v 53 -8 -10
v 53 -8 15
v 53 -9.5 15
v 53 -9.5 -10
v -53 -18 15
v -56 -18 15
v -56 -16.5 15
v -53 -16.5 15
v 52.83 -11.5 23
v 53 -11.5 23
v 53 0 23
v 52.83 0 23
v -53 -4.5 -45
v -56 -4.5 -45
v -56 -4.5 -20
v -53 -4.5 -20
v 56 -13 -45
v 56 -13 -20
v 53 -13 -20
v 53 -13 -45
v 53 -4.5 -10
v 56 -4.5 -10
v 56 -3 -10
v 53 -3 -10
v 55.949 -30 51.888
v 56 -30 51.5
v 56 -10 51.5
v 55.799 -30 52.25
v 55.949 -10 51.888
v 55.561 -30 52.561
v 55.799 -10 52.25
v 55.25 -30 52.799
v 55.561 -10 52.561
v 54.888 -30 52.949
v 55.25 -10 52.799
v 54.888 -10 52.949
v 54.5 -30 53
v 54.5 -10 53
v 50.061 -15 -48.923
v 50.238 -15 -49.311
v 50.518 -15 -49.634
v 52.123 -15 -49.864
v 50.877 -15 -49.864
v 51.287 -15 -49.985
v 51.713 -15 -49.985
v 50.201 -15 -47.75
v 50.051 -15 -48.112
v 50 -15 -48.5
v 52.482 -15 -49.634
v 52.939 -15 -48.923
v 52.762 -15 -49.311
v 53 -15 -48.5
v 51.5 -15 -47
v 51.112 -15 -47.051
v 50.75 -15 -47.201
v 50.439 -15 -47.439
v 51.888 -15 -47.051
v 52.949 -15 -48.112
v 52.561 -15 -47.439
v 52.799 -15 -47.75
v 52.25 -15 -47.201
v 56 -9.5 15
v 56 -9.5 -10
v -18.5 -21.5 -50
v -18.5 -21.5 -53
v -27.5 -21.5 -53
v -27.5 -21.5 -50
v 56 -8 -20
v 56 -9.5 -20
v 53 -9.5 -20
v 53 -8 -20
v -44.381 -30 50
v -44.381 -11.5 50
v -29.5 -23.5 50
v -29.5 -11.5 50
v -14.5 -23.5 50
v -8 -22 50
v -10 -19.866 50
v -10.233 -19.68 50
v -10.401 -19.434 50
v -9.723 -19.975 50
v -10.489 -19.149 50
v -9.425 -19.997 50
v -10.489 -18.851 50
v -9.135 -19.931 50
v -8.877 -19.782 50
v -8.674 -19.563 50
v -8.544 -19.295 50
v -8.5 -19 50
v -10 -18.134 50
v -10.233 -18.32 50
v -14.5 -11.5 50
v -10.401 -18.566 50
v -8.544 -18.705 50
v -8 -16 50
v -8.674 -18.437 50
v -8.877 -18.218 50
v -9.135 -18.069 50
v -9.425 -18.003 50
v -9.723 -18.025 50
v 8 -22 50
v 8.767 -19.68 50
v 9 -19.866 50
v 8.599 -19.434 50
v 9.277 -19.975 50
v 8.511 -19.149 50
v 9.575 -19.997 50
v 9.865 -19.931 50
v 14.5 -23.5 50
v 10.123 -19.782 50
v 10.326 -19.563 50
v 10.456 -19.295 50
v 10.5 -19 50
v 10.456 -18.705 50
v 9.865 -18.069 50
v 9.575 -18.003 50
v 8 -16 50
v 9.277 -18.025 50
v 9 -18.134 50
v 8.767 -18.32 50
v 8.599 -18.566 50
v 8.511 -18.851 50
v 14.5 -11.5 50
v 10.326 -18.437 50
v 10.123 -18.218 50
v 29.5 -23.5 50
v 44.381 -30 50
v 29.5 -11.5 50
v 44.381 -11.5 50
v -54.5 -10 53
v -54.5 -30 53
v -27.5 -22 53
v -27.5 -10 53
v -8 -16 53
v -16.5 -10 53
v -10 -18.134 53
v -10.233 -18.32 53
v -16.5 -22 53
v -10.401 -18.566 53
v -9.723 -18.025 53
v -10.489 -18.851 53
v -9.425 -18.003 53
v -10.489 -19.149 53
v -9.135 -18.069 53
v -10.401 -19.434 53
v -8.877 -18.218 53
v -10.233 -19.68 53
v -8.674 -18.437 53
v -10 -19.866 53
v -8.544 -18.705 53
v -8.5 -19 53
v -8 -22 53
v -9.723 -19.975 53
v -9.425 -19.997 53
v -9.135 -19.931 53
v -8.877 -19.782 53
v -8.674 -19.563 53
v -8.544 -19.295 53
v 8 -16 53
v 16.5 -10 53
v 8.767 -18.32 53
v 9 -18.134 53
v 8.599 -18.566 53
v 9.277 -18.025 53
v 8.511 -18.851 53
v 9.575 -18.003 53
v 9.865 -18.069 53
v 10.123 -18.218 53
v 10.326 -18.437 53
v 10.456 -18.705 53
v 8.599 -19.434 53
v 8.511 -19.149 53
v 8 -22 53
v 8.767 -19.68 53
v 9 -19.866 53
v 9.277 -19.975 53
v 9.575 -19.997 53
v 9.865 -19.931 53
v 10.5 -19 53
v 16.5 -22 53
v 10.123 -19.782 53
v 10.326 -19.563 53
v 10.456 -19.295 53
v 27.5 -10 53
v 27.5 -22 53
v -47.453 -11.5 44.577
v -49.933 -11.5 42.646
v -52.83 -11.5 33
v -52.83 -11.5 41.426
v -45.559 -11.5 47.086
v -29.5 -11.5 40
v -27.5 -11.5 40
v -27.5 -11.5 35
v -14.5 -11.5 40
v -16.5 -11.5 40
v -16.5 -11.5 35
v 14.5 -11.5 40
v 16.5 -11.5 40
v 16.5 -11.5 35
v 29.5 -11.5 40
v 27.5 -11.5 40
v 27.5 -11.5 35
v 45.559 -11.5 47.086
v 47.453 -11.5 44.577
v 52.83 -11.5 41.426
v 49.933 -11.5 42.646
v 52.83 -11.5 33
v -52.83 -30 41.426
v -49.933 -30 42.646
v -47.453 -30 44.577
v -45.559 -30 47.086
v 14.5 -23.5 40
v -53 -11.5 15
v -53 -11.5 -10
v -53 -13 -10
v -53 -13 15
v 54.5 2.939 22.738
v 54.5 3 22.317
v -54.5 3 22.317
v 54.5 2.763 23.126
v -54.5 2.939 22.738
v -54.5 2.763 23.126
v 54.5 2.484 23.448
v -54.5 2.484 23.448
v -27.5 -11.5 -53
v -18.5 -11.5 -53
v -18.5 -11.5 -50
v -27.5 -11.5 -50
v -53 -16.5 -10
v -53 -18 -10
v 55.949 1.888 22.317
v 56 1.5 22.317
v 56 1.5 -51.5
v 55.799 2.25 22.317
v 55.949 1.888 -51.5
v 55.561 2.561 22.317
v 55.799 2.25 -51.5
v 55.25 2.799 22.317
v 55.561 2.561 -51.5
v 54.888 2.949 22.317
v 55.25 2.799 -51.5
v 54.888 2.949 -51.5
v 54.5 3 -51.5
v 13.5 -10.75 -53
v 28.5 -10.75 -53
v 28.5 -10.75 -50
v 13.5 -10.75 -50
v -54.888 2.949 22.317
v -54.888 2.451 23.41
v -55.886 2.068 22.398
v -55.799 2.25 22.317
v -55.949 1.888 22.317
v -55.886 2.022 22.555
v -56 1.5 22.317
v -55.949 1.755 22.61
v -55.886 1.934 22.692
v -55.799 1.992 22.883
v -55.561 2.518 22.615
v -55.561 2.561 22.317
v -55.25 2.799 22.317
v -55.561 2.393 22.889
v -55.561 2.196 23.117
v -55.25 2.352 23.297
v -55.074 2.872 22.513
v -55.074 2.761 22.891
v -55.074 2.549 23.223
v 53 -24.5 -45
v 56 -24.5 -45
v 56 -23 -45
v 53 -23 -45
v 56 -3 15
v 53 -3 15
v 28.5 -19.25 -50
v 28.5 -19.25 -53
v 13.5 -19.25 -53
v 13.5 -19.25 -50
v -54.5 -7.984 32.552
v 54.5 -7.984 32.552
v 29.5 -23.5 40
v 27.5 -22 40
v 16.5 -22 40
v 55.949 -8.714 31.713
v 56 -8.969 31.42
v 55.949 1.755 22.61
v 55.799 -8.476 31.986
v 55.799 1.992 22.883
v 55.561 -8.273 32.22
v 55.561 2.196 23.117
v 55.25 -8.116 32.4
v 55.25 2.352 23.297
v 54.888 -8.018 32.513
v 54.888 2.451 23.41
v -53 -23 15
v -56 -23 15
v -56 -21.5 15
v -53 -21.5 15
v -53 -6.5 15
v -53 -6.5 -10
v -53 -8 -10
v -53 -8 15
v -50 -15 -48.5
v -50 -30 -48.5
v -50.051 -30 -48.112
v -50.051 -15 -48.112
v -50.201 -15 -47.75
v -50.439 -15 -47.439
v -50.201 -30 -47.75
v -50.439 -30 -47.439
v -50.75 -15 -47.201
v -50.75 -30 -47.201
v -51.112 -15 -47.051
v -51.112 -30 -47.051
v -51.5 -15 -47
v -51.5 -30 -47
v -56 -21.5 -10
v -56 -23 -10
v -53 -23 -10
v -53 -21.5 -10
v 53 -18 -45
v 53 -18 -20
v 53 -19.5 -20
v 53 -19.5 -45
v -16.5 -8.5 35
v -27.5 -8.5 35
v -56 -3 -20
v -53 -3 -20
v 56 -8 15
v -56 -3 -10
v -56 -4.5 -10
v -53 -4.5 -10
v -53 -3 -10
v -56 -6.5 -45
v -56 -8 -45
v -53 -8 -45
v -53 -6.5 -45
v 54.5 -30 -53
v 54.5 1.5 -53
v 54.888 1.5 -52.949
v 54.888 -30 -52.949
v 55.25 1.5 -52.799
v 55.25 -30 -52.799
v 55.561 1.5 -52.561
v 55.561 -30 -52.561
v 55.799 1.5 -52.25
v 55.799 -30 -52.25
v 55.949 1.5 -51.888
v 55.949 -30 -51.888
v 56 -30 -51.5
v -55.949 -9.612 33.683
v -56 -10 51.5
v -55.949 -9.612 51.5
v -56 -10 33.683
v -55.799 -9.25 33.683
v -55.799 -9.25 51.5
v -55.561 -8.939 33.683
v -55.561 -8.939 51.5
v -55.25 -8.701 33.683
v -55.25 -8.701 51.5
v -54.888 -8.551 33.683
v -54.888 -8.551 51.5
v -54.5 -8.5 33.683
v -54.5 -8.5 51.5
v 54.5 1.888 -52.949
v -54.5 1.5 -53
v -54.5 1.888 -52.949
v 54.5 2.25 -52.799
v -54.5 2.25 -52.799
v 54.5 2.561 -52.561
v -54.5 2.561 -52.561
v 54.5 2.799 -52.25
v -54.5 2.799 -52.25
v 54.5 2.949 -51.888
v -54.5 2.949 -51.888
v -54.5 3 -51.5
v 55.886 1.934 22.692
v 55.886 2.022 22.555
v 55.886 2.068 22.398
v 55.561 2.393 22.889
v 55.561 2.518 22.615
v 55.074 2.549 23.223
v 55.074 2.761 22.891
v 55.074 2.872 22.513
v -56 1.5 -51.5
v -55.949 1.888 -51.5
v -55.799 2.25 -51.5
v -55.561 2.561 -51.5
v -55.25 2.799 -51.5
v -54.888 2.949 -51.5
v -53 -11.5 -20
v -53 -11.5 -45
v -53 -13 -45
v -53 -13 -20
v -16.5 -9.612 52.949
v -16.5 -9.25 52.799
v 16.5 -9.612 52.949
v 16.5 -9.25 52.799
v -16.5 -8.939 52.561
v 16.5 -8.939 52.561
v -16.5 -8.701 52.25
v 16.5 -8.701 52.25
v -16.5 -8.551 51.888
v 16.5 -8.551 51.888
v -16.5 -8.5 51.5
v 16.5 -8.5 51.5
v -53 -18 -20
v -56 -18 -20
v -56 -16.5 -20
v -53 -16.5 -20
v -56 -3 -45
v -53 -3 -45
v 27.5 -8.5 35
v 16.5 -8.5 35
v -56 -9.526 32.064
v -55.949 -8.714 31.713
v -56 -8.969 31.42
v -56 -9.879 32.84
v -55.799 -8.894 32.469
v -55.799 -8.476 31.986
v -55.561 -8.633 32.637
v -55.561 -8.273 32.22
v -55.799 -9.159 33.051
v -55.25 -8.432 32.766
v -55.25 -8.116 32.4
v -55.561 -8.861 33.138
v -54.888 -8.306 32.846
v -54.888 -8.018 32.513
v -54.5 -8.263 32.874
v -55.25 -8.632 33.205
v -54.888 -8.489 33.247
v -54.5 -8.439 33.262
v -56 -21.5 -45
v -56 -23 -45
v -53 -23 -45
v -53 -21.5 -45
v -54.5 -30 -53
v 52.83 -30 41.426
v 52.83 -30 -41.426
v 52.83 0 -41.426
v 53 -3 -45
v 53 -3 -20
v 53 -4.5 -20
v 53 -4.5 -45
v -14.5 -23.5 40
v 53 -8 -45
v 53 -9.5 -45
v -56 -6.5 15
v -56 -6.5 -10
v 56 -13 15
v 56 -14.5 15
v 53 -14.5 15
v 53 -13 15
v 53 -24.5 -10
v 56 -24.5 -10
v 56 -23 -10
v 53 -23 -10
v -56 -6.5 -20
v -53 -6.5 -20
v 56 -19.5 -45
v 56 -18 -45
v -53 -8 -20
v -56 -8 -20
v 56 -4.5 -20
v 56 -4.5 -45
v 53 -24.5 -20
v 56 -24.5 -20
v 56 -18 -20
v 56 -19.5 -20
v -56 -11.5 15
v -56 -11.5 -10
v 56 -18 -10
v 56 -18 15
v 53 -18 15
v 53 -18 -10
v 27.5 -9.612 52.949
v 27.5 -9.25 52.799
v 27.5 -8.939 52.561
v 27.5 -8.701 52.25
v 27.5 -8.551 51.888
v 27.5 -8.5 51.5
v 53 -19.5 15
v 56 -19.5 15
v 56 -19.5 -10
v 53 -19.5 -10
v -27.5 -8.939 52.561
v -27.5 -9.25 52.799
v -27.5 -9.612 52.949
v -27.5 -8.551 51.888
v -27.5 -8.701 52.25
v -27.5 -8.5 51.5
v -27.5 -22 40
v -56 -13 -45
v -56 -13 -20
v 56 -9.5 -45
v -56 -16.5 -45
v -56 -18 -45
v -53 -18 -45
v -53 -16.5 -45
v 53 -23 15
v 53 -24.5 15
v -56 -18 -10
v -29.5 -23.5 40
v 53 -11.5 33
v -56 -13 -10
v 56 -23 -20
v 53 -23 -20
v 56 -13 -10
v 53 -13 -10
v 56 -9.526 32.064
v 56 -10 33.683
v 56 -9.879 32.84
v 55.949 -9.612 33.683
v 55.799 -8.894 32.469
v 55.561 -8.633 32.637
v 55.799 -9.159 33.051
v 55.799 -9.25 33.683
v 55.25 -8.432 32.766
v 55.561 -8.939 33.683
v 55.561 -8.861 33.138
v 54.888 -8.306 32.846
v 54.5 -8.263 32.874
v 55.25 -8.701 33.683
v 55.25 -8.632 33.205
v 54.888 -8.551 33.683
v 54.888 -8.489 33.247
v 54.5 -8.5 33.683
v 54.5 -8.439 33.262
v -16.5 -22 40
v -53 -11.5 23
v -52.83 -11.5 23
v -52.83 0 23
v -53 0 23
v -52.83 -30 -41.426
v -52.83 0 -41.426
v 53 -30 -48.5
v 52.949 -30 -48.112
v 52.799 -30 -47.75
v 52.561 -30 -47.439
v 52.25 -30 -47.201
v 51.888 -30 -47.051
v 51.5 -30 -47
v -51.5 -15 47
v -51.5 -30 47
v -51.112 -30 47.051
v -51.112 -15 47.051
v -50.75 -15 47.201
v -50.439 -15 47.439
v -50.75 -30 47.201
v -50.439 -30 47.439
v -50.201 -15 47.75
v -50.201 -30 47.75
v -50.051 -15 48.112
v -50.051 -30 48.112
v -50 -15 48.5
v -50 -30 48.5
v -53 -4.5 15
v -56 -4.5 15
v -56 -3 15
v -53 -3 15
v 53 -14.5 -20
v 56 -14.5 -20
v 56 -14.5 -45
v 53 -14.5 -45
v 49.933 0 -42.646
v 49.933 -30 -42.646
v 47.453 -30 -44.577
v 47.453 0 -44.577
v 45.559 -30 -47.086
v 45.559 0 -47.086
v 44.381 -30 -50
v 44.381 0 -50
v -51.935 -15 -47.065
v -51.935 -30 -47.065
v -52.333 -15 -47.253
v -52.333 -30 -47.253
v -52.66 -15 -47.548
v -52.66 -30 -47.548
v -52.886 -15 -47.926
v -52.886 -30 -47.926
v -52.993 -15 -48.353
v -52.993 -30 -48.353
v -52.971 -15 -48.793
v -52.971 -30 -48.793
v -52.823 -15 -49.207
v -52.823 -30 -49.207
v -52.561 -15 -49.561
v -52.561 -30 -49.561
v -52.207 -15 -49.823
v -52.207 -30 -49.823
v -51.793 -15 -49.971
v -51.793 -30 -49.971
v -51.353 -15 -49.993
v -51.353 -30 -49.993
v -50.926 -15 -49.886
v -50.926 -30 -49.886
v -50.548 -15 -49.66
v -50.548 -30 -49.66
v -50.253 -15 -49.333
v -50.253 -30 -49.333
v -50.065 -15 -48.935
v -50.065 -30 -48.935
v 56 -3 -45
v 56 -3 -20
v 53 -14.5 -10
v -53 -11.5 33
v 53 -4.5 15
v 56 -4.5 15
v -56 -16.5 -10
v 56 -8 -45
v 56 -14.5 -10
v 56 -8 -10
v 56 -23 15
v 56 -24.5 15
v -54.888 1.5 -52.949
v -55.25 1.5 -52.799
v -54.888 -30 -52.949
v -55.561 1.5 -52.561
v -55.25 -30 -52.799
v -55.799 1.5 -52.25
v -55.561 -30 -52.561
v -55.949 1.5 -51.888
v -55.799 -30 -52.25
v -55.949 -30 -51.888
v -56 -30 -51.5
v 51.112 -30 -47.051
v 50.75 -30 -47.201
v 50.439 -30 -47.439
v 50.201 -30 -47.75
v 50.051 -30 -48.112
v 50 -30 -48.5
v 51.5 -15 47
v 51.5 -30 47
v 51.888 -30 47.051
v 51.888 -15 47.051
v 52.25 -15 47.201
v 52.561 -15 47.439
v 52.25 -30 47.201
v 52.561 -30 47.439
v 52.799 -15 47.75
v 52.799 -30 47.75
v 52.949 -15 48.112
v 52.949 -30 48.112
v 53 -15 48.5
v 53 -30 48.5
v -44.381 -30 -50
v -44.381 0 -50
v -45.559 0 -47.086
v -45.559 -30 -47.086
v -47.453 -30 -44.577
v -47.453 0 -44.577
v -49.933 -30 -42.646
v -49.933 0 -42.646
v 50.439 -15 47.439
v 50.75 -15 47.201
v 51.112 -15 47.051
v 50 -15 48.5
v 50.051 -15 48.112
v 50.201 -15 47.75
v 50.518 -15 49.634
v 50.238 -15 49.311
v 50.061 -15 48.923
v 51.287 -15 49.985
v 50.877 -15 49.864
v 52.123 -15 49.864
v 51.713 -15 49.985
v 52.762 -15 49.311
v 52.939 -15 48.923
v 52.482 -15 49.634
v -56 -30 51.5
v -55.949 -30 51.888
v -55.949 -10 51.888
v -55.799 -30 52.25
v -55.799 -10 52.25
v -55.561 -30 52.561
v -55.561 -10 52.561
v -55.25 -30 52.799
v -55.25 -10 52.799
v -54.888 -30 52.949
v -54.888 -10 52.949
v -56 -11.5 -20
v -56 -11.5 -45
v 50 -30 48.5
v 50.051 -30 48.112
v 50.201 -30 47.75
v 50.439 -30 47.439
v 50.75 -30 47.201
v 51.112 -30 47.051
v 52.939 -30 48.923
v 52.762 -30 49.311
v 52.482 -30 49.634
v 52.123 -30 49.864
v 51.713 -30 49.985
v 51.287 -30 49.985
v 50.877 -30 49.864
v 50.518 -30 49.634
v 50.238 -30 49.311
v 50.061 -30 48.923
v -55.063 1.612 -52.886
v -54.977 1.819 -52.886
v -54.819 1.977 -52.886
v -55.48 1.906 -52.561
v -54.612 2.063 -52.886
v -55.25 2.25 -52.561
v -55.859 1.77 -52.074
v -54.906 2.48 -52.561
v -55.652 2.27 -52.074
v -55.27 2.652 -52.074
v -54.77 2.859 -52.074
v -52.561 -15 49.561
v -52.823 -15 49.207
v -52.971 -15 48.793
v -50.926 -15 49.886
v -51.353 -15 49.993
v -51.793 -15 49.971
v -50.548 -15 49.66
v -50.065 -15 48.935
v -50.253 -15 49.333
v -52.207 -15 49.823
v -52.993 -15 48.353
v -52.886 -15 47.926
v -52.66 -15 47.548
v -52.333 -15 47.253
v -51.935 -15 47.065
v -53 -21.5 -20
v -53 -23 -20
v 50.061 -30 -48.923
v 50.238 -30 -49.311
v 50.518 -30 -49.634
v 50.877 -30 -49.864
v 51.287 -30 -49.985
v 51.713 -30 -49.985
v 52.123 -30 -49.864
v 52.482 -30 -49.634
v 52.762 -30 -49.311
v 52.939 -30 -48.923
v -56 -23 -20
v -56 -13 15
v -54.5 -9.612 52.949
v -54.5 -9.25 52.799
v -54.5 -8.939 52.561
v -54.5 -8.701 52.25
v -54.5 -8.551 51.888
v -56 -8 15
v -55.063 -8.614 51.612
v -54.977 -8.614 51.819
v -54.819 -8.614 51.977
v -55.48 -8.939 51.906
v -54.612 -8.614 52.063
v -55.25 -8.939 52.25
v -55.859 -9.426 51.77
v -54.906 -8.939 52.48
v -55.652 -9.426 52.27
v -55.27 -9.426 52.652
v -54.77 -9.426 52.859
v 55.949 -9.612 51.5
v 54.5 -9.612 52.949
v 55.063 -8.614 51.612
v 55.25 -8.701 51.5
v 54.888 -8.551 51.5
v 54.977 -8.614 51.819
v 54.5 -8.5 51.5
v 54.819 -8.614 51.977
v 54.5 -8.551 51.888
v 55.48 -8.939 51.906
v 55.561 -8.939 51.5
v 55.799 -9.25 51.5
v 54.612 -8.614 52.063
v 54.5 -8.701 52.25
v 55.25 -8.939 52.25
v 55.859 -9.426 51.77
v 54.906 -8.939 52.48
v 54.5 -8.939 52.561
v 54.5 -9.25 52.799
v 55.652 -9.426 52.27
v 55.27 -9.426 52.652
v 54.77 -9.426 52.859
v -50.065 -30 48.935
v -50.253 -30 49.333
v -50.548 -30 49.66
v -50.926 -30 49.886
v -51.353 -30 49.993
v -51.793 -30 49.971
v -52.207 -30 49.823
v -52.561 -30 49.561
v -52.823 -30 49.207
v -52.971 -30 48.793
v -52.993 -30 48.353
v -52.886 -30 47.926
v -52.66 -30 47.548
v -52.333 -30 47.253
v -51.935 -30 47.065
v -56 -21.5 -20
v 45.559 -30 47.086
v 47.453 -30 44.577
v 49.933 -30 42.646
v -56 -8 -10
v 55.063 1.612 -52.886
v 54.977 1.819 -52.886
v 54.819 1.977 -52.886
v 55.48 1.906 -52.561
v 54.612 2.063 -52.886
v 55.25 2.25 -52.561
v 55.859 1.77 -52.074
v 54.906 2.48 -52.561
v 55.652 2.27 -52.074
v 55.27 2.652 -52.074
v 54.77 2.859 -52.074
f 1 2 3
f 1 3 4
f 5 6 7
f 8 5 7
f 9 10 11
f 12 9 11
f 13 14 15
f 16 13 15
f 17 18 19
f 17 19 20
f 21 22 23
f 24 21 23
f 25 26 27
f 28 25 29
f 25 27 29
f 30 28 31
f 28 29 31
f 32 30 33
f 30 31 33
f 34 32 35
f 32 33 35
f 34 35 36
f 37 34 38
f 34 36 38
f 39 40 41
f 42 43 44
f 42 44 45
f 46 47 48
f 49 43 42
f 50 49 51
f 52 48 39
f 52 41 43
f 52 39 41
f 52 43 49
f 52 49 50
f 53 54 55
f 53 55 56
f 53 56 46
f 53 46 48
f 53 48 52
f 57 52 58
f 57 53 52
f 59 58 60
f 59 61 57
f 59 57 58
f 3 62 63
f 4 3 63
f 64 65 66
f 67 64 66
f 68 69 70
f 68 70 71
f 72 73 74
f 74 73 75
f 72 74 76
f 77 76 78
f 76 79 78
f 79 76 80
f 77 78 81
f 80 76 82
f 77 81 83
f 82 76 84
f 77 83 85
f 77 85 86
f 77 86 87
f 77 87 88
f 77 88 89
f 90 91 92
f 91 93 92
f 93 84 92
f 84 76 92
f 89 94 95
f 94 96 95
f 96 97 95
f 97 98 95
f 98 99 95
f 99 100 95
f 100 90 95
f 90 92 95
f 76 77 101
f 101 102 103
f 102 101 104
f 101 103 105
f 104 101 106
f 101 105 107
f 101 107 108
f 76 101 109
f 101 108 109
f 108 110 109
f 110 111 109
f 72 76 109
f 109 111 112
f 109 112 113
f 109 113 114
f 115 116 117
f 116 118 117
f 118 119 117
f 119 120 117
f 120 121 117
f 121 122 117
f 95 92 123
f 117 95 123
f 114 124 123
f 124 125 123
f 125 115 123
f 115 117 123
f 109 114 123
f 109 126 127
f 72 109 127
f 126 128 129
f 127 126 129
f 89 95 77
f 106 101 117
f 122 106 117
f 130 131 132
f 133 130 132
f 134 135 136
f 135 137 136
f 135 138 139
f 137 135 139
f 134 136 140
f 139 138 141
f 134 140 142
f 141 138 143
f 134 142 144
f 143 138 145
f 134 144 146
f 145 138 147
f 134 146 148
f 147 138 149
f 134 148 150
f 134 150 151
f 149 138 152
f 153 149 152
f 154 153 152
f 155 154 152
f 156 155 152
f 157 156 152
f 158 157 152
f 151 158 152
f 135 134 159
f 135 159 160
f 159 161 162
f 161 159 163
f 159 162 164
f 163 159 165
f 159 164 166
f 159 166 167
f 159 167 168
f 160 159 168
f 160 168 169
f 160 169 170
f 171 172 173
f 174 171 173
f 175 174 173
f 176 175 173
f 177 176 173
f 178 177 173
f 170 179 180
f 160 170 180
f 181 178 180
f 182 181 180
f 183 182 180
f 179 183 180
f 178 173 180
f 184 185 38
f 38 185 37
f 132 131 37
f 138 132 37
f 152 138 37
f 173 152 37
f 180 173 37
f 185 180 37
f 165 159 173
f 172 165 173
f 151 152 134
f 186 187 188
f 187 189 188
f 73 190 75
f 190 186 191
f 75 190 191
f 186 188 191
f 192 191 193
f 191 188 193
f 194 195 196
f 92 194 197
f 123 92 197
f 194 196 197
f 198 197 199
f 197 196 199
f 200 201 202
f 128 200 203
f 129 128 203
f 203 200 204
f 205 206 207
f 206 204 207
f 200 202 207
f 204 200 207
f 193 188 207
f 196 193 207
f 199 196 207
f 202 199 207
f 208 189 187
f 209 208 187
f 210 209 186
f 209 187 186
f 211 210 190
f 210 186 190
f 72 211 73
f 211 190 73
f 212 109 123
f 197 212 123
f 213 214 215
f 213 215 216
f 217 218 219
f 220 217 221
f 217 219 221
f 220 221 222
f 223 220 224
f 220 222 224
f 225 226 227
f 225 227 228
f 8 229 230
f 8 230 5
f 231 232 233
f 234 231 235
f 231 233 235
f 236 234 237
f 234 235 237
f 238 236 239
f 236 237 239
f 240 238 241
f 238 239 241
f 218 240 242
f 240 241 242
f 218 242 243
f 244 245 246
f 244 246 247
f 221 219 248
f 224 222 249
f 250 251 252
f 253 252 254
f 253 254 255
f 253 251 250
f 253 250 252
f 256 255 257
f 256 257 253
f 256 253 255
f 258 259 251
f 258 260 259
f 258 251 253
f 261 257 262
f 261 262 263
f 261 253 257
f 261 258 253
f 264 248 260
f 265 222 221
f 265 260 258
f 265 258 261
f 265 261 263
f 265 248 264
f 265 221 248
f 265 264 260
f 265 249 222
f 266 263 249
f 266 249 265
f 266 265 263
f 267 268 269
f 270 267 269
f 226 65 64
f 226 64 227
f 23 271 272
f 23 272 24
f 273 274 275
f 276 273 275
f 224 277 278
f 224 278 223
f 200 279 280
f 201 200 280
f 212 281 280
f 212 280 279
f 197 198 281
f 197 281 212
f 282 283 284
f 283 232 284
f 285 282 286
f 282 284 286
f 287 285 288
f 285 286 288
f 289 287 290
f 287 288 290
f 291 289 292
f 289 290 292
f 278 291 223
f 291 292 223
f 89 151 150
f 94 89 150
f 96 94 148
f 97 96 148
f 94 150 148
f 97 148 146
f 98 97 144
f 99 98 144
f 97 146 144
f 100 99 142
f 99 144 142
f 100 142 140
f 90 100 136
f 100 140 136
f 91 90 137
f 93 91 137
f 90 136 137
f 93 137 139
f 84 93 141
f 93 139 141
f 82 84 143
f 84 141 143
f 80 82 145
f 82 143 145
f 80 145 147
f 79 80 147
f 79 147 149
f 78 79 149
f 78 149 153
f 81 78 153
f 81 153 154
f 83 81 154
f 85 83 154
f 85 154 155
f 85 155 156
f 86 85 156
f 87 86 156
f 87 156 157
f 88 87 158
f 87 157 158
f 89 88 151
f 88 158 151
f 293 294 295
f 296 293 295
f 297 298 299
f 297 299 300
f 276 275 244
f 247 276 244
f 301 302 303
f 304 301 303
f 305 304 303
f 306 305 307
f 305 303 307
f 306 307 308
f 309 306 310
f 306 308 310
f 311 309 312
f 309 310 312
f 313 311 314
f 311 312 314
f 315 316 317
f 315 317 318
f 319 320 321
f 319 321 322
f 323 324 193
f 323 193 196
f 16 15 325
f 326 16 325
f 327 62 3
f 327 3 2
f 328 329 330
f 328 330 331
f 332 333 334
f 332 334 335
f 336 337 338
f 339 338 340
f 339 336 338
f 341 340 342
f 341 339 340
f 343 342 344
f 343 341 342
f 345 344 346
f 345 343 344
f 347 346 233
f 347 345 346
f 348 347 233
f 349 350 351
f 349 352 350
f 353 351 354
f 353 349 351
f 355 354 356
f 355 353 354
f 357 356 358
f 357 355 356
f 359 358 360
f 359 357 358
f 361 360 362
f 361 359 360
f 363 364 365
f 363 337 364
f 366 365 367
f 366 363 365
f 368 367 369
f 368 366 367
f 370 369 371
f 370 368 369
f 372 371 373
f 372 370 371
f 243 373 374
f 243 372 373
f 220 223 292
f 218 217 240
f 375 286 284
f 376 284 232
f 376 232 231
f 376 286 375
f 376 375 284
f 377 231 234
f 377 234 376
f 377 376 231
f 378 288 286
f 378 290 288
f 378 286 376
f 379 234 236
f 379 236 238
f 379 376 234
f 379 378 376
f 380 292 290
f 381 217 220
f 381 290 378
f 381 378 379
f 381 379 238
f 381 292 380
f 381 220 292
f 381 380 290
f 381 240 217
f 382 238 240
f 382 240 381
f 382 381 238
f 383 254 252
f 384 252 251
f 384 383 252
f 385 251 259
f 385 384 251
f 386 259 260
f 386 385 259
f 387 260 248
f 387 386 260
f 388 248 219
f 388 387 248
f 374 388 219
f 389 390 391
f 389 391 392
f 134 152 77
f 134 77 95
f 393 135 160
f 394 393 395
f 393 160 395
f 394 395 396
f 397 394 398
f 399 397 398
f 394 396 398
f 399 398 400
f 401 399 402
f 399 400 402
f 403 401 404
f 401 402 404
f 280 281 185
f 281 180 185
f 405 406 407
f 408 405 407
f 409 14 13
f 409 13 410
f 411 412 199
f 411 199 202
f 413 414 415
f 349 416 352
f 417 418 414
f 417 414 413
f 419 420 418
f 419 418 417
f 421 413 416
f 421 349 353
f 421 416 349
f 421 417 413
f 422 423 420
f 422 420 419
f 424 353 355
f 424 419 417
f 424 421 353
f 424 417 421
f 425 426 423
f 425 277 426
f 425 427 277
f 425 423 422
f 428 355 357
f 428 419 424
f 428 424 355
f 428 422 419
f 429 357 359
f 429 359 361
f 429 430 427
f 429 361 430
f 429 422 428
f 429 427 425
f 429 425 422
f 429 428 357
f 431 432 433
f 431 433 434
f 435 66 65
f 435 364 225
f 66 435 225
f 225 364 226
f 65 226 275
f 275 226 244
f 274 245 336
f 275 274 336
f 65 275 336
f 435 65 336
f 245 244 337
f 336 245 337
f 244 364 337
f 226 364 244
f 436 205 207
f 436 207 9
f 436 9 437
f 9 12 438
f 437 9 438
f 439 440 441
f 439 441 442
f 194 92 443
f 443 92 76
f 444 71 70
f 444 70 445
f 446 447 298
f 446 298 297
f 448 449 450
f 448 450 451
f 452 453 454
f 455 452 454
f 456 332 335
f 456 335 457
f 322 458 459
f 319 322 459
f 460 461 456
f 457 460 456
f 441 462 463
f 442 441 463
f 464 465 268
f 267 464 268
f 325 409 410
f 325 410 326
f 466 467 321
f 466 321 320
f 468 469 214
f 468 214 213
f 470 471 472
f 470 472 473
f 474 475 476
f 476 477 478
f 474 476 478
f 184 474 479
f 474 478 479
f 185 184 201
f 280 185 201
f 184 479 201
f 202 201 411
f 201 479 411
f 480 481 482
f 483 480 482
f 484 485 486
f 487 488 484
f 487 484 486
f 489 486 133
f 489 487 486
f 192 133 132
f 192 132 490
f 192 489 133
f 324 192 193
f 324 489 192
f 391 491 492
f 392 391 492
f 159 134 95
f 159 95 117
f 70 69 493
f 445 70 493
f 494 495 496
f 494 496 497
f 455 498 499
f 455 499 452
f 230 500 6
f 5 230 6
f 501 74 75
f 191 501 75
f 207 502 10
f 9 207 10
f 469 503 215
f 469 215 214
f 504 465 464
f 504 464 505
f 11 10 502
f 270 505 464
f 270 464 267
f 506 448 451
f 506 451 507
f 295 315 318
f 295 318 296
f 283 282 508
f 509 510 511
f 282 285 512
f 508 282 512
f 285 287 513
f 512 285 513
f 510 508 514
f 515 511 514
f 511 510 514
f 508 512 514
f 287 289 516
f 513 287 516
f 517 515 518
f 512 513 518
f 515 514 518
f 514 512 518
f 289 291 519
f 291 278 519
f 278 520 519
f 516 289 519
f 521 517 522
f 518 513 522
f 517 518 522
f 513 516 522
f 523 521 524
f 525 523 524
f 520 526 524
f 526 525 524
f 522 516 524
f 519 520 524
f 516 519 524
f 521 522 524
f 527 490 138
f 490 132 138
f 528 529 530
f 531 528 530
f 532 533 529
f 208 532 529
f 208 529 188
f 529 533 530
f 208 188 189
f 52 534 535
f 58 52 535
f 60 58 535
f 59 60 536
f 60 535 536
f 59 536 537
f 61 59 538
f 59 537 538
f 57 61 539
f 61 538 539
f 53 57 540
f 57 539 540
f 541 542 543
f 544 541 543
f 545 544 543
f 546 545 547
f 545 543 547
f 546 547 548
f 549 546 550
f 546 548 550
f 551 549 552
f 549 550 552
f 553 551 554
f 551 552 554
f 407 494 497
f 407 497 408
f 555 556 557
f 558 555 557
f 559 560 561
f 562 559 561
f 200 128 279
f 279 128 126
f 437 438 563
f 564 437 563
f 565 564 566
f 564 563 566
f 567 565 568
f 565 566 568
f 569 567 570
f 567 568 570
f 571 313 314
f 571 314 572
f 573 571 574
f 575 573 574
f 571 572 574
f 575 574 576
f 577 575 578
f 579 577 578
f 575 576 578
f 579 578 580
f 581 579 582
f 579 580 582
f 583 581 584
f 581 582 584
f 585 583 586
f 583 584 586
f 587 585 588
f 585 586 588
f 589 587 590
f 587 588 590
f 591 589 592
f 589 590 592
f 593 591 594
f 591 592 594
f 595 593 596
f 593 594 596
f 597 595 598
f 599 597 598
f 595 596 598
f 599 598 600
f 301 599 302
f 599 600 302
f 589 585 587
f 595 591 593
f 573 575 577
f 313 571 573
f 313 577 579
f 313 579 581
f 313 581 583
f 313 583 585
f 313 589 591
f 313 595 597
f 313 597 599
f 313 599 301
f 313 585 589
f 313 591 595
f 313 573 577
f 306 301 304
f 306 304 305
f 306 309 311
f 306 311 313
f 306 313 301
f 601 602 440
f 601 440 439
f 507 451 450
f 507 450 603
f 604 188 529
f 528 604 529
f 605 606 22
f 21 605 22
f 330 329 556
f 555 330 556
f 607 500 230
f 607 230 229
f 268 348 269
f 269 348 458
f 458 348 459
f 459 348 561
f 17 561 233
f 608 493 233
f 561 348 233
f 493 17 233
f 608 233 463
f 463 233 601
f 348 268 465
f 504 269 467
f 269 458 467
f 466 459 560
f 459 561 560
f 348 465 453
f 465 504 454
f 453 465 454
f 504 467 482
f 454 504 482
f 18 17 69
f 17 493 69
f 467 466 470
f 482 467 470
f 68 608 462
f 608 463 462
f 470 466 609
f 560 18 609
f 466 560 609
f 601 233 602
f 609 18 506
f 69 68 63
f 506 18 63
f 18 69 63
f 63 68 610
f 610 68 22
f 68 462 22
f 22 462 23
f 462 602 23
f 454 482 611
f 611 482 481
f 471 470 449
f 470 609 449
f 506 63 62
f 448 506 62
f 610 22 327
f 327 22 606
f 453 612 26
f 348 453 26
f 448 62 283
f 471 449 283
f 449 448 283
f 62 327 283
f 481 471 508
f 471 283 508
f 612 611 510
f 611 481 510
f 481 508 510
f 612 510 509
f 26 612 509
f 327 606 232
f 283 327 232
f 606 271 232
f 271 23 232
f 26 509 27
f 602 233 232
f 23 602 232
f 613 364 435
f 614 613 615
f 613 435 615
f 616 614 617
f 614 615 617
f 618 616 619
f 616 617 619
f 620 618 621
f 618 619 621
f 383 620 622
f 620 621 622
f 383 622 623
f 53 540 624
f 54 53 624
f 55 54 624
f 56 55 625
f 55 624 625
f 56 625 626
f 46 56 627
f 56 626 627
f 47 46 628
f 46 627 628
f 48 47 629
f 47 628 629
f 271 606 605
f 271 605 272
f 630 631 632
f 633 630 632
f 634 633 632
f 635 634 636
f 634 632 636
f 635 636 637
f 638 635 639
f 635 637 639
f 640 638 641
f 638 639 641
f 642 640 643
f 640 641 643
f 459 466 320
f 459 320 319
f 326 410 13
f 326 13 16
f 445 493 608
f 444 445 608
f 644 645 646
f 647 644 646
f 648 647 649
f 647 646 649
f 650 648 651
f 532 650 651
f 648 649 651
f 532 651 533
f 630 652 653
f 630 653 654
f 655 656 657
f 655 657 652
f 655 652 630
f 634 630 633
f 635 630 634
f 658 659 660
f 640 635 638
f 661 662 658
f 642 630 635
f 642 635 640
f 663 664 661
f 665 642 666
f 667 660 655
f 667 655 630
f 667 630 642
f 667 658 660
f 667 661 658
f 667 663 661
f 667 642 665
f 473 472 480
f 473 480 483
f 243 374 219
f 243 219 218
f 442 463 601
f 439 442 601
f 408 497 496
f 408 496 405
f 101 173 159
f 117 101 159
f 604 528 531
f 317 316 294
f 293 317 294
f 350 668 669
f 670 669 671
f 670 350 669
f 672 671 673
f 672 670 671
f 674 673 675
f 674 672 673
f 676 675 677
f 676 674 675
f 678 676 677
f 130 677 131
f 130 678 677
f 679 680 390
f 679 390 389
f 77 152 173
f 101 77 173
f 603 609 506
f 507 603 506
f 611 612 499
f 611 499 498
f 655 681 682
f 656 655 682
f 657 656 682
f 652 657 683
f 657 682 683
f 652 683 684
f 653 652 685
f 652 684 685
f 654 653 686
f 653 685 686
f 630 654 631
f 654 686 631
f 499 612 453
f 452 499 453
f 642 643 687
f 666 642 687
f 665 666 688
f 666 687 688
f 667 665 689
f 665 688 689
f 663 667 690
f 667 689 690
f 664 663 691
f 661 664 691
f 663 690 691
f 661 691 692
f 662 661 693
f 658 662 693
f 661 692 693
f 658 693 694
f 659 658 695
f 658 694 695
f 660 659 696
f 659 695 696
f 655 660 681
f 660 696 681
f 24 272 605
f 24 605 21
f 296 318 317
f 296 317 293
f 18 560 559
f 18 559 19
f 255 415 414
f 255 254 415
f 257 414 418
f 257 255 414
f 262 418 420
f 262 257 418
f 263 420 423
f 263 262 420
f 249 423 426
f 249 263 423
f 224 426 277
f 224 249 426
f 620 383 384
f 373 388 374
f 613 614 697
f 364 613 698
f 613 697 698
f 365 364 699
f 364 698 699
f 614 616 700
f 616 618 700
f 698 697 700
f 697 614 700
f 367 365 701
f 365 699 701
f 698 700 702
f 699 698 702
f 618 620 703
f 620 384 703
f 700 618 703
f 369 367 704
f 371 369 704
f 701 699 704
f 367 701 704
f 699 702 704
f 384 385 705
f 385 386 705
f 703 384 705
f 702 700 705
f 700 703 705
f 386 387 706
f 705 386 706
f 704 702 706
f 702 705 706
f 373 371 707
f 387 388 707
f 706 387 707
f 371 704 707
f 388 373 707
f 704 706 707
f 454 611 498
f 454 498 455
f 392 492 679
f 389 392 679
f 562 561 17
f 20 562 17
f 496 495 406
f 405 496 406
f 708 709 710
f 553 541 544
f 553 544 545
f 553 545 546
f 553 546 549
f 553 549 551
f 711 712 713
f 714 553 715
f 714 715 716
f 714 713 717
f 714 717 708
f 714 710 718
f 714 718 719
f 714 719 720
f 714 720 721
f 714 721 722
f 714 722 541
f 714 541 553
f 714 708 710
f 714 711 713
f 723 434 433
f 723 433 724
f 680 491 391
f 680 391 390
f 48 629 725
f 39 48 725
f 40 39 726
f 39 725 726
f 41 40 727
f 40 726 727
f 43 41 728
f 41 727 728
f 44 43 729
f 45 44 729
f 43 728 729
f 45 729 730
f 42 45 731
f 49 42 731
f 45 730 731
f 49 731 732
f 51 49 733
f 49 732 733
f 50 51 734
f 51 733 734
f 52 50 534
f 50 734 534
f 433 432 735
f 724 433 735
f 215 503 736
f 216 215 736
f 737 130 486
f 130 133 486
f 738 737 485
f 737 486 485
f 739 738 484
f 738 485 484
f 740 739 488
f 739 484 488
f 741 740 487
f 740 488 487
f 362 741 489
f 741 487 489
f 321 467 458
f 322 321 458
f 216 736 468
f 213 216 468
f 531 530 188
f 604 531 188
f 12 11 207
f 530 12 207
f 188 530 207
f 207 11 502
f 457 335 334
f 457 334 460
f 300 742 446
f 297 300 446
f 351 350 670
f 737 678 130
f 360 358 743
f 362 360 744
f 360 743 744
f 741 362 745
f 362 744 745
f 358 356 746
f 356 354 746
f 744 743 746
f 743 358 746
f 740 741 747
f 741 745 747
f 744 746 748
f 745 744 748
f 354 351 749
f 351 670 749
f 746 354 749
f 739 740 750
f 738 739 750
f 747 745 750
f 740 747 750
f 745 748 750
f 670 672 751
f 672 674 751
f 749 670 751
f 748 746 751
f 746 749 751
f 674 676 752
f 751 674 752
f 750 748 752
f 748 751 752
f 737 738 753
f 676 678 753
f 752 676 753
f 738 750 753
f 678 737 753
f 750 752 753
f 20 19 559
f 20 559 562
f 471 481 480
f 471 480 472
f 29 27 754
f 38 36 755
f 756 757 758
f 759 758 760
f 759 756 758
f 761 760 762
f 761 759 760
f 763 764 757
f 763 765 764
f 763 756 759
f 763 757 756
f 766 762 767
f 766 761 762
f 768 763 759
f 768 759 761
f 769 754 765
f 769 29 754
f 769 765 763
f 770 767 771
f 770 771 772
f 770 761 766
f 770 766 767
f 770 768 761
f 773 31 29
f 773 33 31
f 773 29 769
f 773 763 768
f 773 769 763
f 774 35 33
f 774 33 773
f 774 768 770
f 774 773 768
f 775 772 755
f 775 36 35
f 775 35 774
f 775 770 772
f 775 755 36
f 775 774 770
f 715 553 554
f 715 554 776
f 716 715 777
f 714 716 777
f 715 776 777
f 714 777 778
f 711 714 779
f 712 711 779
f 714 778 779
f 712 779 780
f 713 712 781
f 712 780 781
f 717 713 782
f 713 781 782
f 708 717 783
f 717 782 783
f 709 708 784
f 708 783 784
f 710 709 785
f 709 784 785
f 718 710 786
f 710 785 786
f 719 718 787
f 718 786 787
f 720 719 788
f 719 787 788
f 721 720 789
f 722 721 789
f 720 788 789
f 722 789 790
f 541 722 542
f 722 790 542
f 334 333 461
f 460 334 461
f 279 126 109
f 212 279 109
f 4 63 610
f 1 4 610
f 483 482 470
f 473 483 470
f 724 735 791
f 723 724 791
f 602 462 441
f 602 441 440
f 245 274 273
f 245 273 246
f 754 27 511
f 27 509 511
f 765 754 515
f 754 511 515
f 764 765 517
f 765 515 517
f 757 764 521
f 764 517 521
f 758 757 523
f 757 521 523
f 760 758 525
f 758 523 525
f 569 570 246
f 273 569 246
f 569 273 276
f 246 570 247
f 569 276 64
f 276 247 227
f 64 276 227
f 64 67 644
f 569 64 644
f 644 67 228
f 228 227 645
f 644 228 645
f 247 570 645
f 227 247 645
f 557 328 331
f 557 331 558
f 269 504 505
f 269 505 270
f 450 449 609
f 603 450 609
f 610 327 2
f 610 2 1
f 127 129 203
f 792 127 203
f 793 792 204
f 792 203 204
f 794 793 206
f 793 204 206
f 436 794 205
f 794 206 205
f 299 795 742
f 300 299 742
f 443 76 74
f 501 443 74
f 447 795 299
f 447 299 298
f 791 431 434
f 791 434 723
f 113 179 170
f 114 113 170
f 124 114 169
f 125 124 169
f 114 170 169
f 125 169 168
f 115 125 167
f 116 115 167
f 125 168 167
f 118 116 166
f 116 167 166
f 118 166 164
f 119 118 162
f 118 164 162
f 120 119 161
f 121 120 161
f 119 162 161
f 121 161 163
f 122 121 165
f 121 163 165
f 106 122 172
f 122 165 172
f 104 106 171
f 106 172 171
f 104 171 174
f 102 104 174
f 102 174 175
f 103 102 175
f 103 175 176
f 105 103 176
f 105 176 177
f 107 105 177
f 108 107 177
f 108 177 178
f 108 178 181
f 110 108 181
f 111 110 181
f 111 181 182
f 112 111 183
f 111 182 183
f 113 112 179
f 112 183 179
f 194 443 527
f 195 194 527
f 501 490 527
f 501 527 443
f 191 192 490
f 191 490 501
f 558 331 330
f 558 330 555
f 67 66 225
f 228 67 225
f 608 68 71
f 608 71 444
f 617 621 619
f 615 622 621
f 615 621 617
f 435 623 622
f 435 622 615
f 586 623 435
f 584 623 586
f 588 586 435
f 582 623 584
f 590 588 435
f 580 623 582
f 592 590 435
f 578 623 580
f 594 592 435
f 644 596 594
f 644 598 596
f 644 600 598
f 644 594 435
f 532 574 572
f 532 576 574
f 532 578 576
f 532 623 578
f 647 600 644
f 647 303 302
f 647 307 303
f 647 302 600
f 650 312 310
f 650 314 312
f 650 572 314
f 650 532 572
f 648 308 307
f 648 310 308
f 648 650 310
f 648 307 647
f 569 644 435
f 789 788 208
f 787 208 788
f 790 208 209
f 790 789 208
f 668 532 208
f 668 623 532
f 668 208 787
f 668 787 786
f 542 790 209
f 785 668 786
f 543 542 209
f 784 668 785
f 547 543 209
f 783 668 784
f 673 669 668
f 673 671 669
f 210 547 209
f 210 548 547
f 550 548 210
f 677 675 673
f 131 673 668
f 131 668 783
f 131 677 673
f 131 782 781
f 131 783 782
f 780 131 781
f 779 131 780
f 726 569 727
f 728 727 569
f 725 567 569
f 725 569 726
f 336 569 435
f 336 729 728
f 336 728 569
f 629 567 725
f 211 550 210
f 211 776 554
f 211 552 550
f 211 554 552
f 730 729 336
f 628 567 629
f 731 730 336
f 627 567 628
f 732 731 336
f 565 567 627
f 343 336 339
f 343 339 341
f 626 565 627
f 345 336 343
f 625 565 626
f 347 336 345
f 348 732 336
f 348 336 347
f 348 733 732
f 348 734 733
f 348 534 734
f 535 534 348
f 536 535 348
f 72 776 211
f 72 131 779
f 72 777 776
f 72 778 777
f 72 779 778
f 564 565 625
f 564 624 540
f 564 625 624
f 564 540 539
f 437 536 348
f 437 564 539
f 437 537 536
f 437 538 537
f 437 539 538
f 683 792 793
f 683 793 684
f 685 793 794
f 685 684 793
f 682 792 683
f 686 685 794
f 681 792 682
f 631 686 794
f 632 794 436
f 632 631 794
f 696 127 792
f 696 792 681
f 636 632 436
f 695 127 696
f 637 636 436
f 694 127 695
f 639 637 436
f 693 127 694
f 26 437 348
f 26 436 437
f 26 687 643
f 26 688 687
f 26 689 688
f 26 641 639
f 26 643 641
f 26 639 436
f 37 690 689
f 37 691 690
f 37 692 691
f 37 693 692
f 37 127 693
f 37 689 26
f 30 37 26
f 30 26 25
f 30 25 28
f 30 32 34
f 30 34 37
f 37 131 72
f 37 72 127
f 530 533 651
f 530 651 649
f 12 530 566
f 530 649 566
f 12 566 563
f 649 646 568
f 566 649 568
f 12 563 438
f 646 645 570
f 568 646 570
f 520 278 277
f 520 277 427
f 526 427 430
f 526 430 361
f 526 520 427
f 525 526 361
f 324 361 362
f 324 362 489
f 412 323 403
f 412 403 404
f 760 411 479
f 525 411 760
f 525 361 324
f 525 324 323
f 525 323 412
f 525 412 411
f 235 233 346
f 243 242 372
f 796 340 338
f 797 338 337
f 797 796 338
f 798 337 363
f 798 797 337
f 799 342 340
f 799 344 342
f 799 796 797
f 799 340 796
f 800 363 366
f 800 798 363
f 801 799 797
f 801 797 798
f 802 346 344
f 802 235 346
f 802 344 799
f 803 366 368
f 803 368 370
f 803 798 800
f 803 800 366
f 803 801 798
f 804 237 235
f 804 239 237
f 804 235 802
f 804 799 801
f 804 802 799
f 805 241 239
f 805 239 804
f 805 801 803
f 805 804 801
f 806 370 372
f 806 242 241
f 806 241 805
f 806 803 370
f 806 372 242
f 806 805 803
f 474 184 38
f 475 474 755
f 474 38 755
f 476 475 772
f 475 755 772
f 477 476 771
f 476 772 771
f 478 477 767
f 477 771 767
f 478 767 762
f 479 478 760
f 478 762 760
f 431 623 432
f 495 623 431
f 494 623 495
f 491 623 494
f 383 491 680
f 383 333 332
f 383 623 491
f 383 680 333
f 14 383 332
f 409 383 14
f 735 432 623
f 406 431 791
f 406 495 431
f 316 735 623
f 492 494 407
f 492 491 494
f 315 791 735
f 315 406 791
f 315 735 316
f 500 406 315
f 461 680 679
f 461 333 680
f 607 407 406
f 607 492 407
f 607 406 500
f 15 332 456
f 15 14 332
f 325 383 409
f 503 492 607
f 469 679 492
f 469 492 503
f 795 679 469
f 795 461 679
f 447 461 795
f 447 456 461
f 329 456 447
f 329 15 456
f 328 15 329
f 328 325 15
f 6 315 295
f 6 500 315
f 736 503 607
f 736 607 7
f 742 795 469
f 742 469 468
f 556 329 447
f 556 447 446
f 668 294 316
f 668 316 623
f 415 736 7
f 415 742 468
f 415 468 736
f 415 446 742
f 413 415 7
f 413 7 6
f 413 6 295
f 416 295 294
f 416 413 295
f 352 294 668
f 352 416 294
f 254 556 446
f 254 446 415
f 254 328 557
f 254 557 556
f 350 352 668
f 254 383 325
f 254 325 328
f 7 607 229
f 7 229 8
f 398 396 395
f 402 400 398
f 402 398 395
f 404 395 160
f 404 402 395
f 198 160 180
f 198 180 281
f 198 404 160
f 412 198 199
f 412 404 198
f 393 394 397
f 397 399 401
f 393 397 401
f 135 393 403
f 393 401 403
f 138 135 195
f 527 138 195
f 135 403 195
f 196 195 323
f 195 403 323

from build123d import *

# Parameters (mm, degrees)
SKETCH1_W            = 112
SKETCH1_H            = 106
BOSS_EXTRUDE1_DEPTH  = 3
SKETCH3_W            = 112
SKETCH3_H            = 106
BOSS_EXTRUDE2_DEPTH  = 30
SKETCH4_R            = 1.5
CUT_EXTRUDE1_DEPTH   = 15
SKETCH5_R            = 1
SKETCH5_W            = 16
SKETCH5_H            = 6
CUT_EXTRUDE2_DEPTH   = 3
SKETCH7_W            = 30
SKETCH7_H            = 14.5
CUT_EXTRUDE4_DEPTH   = 112
SKETCH9_W            = 112
SKETCH9_H            = 20
BOSS_EXTRUDE3_DEPTH  = 3
SKETCH10_W           = 11
SKETCH10_H           = 18
CUT_EXTRUDE5_DEPTH   = 13.5
BOSS_EXTRUDE4_DEPTH  = 112
BOSS_EXTRUDE5_DEPTH  = 3
BOSS_EXTRUDE6_DEPTH  = 3
SKETCH19_W           = 9
SKETCH19_H           = 10
CUT_EXTRUDE7_DEPTH   = 3
SKETCH20_W           = 12
SKETCH20_H           = 13
SKETCH20_W_2         = 9
SKETCH20_H_2         = 10
BOSS_EXTRUDE8_DEPTH  = 3
SKETCH21_W           = 15
SKETCH21_H           = 8.5
CUT_EXTRUDE8_DEPTH   = 3
SKETCH23_W           = 25
SKETCH23_H           = 1.5
CUT_EXTRUDE9_DEPTH   = 3
SKETCH24_W           = 25
SKETCH24_H           = 1.5
CUT_EXTRUDE10_DEPTH  = 3
FILLET1_R            = 1.5
BOSS_EXTRUDE16_DEPTH = 10


with BuildPart() as part:
    # Sketch1 → Boss-Extrude1 (new body)
    with BuildSketch(Plane(origin=(0, 0, 0), x_dir=(1, 0, 0), z_dir=(0, 1, 0))):
        Rectangle(SKETCH1_W, SKETCH1_H)
    extrude(amount=BOSS_EXTRUDE1_DEPTH)

    # Sketch3 → Boss-Extrude2 (add)
    with BuildSketch(Plane.XZ):
        Rectangle(SKETCH3_W, SKETCH3_H)
        with BuildLine():
            Line((44.381049961, -50), (-44.381049961, -50))
            ThreePointArc((-44.381049961, -50), (-47.452820621, -44.577071492), (-52.830188679, -41.426223771))
            Line((-52.830188679, -41.426223771), (-52.830188679, 41.426223771))
            ThreePointArc((-52.830188679, 41.426223771), (-47.452820621, 44.577071492), (-44.381049961, 50))
            Line((-44.381049961, 50), (44.381049961, 50))
            ThreePointArc((44.381049961, 50), (47.452820621, 44.577071492), (52.830188679, 41.426223771))
            Line((52.830188679, 41.426223771), (52.830188679, -41.426223771))
            ThreePointArc((52.830188679, -41.426223771), (47.452820621, -44.577071492), (44.381049961, -50))
        make_face(mode=Mode.SUBTRACT)
    extrude(amount=BOSS_EXTRUDE2_DEPTH)

    # Sketch4 → Cut-Extrude1 (cut)
    with BuildSketch(Plane.XZ.offset(30)):
        with Locations((-51.5, -48.5)):
            Circle(SKETCH4_R)
        with Locations((51.5, -48.5)):
            Circle(SKETCH4_R)
        with Locations((-51.5, 48.5)):
            Circle(SKETCH4_R)
        with Locations((51.5, 48.5)):
            Circle(SKETCH4_R)
    extrude(amount=-CUT_EXTRUDE1_DEPTH, mode=Mode.SUBTRACT)

    # Sketch5 → Cut-Extrude2 (cut)
    with BuildSketch(Plane.XY.offset(53)):
        with Locations((9.5, -19)):
            Circle(SKETCH5_R)
        with Locations((-9.5, -19)):
            Circle(SKETCH5_R)
        with Locations((0, -19)):
            Rectangle(SKETCH5_W, SKETCH5_H)
    extrude(amount=-CUT_EXTRUDE2_DEPTH, mode=Mode.SUBTRACT)

    # Sketch7 → Cut-Extrude4 (cut)
    with BuildSketch(Plane(origin=(56, 0, 0), x_dir=(0, 0, -1), z_dir=(1, 0, 0))):
        with Locations((-38, -4.25)):
            Rectangle(SKETCH7_W, SKETCH7_H)
    extrude(amount=-CUT_EXTRUDE4_DEPTH, mode=Mode.SUBTRACT)

    # Sketch9 → Boss-Extrude3 (add)
    with BuildSketch(Plane(origin=(0, -11.5, 0), x_dir=(1, 0, 0), z_dir=(0, 1, 0))):
        with Locations((0, -43)):
            Rectangle(SKETCH9_W, SKETCH9_H)
    extrude(amount=BOSS_EXTRUDE3_DEPTH)

    # Sketch10 → Cut-Extrude5 (cut)
    with BuildSketch(Plane(origin=(0, -8.5, 0), x_dir=(1, 0, 0), z_dir=(0, 1, 0))):
        with Locations((-22, -44)):
            Rectangle(SKETCH10_W, SKETCH10_H)
        with Locations((22, -44)):
            Rectangle(SKETCH10_W, SKETCH10_H)
    extrude(amount=-CUT_EXTRUDE5_DEPTH, mode=Mode.SUBTRACT)

    # Sketch11 → Boss-Extrude4 (add)
    with BuildSketch(Plane(origin=(56, 0, 0), x_dir=(0, 0, -1), z_dir=(1, 0, 0))):
        Polygon((-33, -8.5), (-23, 3), (-23, 0), (-33, -11.5), align=None)
    extrude(amount=-BOSS_EXTRUDE4_DEPTH)

    # Sketch13 → Boss-Extrude5 (add)
    with BuildSketch(Plane(origin=(56, 0, 0), x_dir=(0, 0, -1), z_dir=(1, 0, 0))):
        Polygon((-33, -11.5), (-23, 0), (-23, -11.5), align=None)
    extrude(amount=-BOSS_EXTRUDE5_DEPTH)

    # Sketch14 → Boss-Extrude6 (add)
    with BuildSketch(Plane.ZY.offset(56)):
        Polygon((23, 0), (23, -11.5), (33, -11.5), align=None)
    extrude(amount=-BOSS_EXTRUDE6_DEPTH)

    # Sketch19 → Cut-Extrude7 (cut)
    with BuildSketch(Plane(origin=(0, 0, -53), x_dir=(-1, 0, 0), z_dir=(0, 0, -1))):
        with Locations((23, -16.5)):
            Rectangle(SKETCH19_W, SKETCH19_H)
    extrude(amount=-CUT_EXTRUDE7_DEPTH, mode=Mode.SUBTRACT)

    # Sketch20 → Boss-Extrude8 (add)
    with BuildSketch(Plane.XY.offset(-53)):
        with Locations((-23, -16.5)):
            Rectangle(SKETCH20_W, SKETCH20_H)
        with Locations((-23, -16.5)):
            Rectangle(SKETCH20_W_2, SKETCH20_H_2, mode=Mode.SUBTRACT)
    extrude(amount=BOSS_EXTRUDE8_DEPTH)

    # Sketch21 → Cut-Extrude8 (cut)
    with BuildSketch(Plane(origin=(0, 0, -53), x_dir=(-1, 0, 0), z_dir=(0, 0, -1))):
        with Locations((-21, -15)):
            Rectangle(SKETCH21_W, SKETCH21_H)
    extrude(amount=-CUT_EXTRUDE8_DEPTH, mode=Mode.SUBTRACT)

    # Sketch23 → Cut-Extrude9 (cut)
    with BuildSketch(Plane(origin=(56, 0, 0), x_dir=(0, 0, -1), z_dir=(1, 0, 0))):
        with Locations((32.5, -8.75)):
            Rectangle(SKETCH23_W, SKETCH23_H)
        with Locations((32.5, -3.75)):
            Rectangle(SKETCH23_W, SKETCH23_H)
        with Locations((32.5, -13.75)):
            Rectangle(SKETCH23_W, SKETCH23_H)
        with Locations((32.5, -18.75)):
            Rectangle(SKETCH23_W, SKETCH23_H)
        with Locations((32.5, -23.75)):
            Rectangle(SKETCH23_W, SKETCH23_H)
        with Locations((-2.5, -23.75)):
            Rectangle(SKETCH23_W, SKETCH23_H)
        with Locations((-2.5, -18.75)):
            Rectangle(SKETCH23_W, SKETCH23_H)
        with Locations((-2.5, -13.75)):
            Rectangle(SKETCH23_W, SKETCH23_H)
        with Locations((-2.5, -8.75)):
            Rectangle(SKETCH23_W, SKETCH23_H)
        with Locations((-2.5, -3.75)):
            Rectangle(SKETCH23_W, SKETCH23_H)
    extrude(amount=-CUT_EXTRUDE9_DEPTH, mode=Mode.SUBTRACT)

    # Sketch24 → Cut-Extrude10 (cut)
    with BuildSketch(Plane.ZY.offset(56)):
        with Locations((2.5, -7.25)):
            Rectangle(SKETCH24_W, SKETCH24_H)
        with Locations((2.5, -3.75)):
            Rectangle(SKETCH24_W, SKETCH24_H)
        with Locations((2.5, -12.25)):
            Rectangle(SKETCH24_W, SKETCH24_H)
        with Locations((2.5, -17.25)):
            Rectangle(SKETCH24_W, SKETCH24_H)
        with Locations((2.5, -22.25)):
            Rectangle(SKETCH24_W, SKETCH24_H)
        with Locations((-32.5, -22.25)):
            Rectangle(SKETCH24_W, SKETCH24_H)
        with Locations((-32.5, -17.25)):
            Rectangle(SKETCH24_W, SKETCH24_H)
        with Locations((-32.5, -12.25)):
            Rectangle(SKETCH24_W, SKETCH24_H)
        with Locations((-32.5, -7.25)):
            Rectangle(SKETCH24_W, SKETCH24_H)
        with Locations((-32.5, -3.75)):
            Rectangle(SKETCH24_W, SKETCH24_H)
    extrude(amount=-CUT_EXTRUDE10_DEPTH, mode=Mode.SUBTRACT)

    # Fillet1
    fillet1_edges = [part.edges().sort_by_distance(p)[0] for p in [
        (56, -8.5, 43),
        (-56, -8.5, 43),
        (0, -8.5, 33),
        (-56, -2.75, 28),
        (56, -2.75, 28),
        (0, 3, -53),
        (56, 3, -15),
        (0, 3, 23),
        (-56, 3, -15),
        (-56, -13.5, -53),
        (56, -13.5, -53),
        (56, -19.25, 53),
        (-56, -19.25, 53),
        (41.75, -8.5, 53),
        (-41.75, -8.5, 53),
        (0, -8.5, 53),
    ]]
    fillet(fillet1_edges, radius=FILLET1_R)

    # Sketch31 → Boss-Extrude16 (add)
    with BuildSketch(Plane(origin=(0, 0, 50), x_dir=(-1, 0, 0), z_dir=(0, 0, -1))):
        Polygon((16.5, -11.5), (14.5, -11.5), (14.5, -23.5), (29.5, -23.5), (29.5, -11.5), (27.5, -11.5), (27.5, -22), (16.5, -22), align=None)
        Polygon((-27.5, -11.5), (-29.5, -11.5), (-29.5, -23.5), (-14.5, -23.5), (-14.5, -11.5), (-16.5, -11.5), (-16.5, -22), (-27.5, -22), align=None)
    extrude(amount=BOSS_EXTRUDE16_DEPTH)


solid = part.part
